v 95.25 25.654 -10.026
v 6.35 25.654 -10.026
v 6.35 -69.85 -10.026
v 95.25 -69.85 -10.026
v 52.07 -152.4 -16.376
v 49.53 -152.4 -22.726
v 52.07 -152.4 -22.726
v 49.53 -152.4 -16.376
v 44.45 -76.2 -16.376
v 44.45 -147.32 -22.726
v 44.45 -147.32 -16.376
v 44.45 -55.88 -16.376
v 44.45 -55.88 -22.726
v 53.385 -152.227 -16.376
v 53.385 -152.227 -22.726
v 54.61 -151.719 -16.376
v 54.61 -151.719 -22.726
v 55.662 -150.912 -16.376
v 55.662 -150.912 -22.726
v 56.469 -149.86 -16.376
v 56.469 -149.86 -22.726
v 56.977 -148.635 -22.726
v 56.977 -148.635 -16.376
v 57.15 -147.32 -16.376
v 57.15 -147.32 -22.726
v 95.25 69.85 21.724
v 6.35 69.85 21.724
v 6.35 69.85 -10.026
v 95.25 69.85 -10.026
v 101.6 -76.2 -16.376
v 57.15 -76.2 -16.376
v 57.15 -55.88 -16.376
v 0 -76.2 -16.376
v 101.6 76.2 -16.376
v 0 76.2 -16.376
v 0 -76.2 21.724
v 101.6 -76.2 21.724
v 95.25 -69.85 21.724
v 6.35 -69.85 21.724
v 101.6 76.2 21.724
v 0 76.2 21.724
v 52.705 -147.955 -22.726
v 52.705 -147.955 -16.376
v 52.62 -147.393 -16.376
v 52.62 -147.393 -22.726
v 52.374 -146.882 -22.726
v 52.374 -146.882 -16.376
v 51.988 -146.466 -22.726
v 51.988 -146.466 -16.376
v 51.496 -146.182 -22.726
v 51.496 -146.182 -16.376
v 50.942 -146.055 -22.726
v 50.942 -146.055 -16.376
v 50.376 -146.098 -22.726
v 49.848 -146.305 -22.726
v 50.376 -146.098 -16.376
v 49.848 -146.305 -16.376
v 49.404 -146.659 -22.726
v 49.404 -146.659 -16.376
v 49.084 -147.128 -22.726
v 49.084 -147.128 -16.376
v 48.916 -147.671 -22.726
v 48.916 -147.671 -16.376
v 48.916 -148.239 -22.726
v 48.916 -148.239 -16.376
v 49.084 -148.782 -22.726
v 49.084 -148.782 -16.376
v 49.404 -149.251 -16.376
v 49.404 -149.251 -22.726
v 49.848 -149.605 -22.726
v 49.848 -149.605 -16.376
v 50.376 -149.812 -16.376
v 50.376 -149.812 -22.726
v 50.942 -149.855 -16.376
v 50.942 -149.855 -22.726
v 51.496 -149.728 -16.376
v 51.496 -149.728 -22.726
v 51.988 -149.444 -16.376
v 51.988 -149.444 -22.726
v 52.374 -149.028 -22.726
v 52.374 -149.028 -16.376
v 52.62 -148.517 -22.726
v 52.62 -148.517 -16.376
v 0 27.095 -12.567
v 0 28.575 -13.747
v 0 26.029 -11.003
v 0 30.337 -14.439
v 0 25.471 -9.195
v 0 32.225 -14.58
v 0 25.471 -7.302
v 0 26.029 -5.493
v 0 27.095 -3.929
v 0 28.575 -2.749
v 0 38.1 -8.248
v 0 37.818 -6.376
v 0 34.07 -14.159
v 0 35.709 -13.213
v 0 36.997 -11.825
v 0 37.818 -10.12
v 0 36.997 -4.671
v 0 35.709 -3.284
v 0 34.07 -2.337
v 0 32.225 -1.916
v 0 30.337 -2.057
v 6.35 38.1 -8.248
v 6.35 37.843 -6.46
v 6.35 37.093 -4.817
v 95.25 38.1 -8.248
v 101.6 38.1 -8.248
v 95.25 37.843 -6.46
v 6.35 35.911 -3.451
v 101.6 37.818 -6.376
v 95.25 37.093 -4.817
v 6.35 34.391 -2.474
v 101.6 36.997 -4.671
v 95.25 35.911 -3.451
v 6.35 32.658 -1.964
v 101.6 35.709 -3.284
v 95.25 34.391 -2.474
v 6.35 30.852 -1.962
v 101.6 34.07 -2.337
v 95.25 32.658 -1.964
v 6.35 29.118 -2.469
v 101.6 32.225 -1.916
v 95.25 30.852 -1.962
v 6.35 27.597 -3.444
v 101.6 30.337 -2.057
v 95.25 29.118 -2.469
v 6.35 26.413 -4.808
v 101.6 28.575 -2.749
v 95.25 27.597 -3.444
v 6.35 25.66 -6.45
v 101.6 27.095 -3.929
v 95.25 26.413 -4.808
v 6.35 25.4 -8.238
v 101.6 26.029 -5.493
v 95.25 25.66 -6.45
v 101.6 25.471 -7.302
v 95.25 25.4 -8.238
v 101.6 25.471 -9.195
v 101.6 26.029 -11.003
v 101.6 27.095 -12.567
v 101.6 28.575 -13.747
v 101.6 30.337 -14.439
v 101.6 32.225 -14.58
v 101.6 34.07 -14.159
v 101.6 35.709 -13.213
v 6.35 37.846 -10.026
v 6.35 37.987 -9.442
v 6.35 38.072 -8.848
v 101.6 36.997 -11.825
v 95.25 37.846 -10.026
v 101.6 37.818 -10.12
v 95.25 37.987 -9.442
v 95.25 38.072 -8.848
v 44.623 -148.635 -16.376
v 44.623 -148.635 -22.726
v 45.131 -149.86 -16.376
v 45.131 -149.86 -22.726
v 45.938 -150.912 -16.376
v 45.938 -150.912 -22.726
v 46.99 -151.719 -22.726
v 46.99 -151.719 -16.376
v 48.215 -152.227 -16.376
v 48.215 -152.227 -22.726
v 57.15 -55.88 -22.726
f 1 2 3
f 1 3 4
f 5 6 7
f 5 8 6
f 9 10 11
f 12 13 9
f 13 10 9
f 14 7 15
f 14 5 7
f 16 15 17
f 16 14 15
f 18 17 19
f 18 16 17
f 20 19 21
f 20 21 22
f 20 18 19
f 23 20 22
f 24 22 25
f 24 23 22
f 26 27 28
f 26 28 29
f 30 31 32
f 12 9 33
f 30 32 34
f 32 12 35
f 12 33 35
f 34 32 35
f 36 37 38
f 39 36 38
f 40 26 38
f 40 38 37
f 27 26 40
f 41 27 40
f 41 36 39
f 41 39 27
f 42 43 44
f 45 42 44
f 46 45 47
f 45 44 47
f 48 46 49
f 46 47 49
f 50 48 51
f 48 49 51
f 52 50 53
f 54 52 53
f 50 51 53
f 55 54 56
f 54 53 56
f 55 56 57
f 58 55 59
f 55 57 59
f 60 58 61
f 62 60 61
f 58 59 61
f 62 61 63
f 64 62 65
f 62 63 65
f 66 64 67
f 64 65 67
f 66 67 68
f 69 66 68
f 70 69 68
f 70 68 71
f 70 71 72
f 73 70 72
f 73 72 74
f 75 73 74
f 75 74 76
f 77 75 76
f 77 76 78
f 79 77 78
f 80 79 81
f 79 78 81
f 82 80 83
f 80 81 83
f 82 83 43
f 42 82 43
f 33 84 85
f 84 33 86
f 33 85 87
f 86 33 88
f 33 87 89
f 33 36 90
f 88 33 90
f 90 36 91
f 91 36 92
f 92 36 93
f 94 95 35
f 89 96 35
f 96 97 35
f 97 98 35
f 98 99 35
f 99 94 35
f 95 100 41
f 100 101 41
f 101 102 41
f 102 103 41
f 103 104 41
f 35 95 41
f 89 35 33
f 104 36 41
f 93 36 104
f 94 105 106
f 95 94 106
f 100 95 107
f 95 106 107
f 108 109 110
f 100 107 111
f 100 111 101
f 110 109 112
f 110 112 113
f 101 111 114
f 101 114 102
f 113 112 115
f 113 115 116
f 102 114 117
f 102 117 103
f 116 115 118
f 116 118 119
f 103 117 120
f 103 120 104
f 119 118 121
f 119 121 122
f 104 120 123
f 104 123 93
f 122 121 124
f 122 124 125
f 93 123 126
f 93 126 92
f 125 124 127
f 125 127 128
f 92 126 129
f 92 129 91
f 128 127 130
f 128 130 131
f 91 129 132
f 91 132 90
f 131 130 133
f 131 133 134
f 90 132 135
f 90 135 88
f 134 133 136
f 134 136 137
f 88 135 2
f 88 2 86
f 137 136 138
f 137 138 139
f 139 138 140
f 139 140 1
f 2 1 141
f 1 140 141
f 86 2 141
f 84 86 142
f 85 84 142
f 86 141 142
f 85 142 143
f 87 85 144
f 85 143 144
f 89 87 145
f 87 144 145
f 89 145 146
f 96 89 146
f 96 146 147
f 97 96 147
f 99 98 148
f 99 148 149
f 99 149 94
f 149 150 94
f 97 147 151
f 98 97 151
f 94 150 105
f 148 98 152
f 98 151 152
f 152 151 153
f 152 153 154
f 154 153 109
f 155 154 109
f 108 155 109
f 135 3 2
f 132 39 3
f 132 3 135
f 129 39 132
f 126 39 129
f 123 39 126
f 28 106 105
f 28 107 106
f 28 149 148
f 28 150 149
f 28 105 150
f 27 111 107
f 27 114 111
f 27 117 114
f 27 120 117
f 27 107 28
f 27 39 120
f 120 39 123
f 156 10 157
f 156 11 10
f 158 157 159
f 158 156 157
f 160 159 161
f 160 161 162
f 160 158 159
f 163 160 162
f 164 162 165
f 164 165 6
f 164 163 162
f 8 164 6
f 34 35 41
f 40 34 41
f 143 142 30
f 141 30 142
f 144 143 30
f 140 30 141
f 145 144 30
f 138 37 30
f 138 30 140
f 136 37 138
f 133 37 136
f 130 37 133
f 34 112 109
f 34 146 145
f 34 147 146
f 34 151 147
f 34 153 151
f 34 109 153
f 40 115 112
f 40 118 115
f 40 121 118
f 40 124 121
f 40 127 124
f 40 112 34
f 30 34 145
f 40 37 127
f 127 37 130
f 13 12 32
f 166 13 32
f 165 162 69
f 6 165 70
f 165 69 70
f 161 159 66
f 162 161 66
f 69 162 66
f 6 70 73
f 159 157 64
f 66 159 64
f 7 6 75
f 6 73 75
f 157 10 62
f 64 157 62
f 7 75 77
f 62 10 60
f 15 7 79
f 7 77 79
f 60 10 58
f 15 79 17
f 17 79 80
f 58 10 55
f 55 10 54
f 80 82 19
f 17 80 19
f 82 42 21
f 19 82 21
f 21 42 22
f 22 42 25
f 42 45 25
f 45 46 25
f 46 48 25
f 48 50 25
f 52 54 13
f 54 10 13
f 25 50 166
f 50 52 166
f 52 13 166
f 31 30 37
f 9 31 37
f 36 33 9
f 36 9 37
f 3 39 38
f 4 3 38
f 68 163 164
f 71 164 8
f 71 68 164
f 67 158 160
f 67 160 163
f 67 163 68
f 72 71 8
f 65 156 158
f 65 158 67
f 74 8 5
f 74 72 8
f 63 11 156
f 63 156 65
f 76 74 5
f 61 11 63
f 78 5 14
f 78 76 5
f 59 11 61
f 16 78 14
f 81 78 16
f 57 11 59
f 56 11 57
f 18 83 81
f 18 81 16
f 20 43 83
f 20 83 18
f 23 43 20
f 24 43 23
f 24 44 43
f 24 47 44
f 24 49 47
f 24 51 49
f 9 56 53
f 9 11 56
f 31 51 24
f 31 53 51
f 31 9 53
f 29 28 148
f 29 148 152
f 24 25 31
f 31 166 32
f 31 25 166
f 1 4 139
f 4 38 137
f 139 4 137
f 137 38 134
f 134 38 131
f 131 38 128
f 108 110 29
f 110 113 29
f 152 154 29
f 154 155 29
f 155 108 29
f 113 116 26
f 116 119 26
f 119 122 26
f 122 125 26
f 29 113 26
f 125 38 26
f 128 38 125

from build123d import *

# Parameters (mm, degrees)
F0_W      = 152.4
F0_H      = 38.1
F1_DEPTH  = 101.6
F2_W      = 88.9
F2_H      = 139.7
F3_DEPTH  = 31.75
F4_R      = 6.35
F5_DEPTH  = 101.6
F6_W      = 12.7
F6_H      = 20.32
F7_DEPTH  = 6.35
F8_W      = 12.7
F8_H      = 6.35
F9_DEPTH  = 76.2
F10_R     = 1.905
F11_DEPTH = 6.35
F12_R     = 5.08


# Not quite as in the source:
# - two fillets or chamfers of one size are made in one step
# - a feature names something its author has since deleted; it is built from what else it names


with BuildPart() as f1:
    # F0 (on Right) → F1 (new body)
    with BuildSketch(Plane.YZ):
        with Locations((3.7253e-06, 2.6738062448)):
            Rectangle(F0_W, F0_H)
    extrude(amount=F1_DEPTH)

    # F2 (on face) → F3 (cut)
    with BuildSketch(Plane.XY.offset(21.7238062448)):
        with Locations((50.8, 3.7253e-06)):
            Rectangle(F2_W, F2_H)
    extrude(amount=-F3_DEPTH, mode=Mode.SUBTRACT)

    # F4 (on face) → F5 (cut)
    with BuildSketch(Plane.YZ.offset(101.6)):
        with Locations((31.7500037253, -8.2481937552)):
            Circle(F4_R)
    extrude(amount=-F5_DEPTH, mode=Mode.SUBTRACT)

    # F6 (on face) → F7 (join)
    with BuildSketch(Plane(origin=(0, 0, -16.3761937552), x_dir=(1, 0, 0), z_dir=(0, 0, -1))):
        with Locations((50.8, 66.0399962747)):
            Rectangle(F6_W, F6_H)
    extrude(amount=F7_DEPTH)

    # F8 (on face) → F9 (join)
    with BuildSketch(Plane.XZ.offset(76.1999962747)):
        with Locations((50.8, -19.5511937552)):
            Rectangle(F8_W, F8_H)
    extrude(amount=F9_DEPTH)

    # F10 (on face) → F11 (cut)
    with BuildSketch(Plane.XY.offset(-16.3761937552)):
        with Locations((50.8, -147.9549962747)):
            Circle(F10_R)
    extrude(amount=-F11_DEPTH, mode=Mode.SUBTRACT)

    # F12
    f12_edges = [f1.edges().sort_by_distance(p)[0] for p in [
        (44.45, -152.399996, -19.551194),
        (57.15, -152.399996, -19.551194),
    ]]
    fillet(f12_edges, radius=F12_R)


solid = f1.part
